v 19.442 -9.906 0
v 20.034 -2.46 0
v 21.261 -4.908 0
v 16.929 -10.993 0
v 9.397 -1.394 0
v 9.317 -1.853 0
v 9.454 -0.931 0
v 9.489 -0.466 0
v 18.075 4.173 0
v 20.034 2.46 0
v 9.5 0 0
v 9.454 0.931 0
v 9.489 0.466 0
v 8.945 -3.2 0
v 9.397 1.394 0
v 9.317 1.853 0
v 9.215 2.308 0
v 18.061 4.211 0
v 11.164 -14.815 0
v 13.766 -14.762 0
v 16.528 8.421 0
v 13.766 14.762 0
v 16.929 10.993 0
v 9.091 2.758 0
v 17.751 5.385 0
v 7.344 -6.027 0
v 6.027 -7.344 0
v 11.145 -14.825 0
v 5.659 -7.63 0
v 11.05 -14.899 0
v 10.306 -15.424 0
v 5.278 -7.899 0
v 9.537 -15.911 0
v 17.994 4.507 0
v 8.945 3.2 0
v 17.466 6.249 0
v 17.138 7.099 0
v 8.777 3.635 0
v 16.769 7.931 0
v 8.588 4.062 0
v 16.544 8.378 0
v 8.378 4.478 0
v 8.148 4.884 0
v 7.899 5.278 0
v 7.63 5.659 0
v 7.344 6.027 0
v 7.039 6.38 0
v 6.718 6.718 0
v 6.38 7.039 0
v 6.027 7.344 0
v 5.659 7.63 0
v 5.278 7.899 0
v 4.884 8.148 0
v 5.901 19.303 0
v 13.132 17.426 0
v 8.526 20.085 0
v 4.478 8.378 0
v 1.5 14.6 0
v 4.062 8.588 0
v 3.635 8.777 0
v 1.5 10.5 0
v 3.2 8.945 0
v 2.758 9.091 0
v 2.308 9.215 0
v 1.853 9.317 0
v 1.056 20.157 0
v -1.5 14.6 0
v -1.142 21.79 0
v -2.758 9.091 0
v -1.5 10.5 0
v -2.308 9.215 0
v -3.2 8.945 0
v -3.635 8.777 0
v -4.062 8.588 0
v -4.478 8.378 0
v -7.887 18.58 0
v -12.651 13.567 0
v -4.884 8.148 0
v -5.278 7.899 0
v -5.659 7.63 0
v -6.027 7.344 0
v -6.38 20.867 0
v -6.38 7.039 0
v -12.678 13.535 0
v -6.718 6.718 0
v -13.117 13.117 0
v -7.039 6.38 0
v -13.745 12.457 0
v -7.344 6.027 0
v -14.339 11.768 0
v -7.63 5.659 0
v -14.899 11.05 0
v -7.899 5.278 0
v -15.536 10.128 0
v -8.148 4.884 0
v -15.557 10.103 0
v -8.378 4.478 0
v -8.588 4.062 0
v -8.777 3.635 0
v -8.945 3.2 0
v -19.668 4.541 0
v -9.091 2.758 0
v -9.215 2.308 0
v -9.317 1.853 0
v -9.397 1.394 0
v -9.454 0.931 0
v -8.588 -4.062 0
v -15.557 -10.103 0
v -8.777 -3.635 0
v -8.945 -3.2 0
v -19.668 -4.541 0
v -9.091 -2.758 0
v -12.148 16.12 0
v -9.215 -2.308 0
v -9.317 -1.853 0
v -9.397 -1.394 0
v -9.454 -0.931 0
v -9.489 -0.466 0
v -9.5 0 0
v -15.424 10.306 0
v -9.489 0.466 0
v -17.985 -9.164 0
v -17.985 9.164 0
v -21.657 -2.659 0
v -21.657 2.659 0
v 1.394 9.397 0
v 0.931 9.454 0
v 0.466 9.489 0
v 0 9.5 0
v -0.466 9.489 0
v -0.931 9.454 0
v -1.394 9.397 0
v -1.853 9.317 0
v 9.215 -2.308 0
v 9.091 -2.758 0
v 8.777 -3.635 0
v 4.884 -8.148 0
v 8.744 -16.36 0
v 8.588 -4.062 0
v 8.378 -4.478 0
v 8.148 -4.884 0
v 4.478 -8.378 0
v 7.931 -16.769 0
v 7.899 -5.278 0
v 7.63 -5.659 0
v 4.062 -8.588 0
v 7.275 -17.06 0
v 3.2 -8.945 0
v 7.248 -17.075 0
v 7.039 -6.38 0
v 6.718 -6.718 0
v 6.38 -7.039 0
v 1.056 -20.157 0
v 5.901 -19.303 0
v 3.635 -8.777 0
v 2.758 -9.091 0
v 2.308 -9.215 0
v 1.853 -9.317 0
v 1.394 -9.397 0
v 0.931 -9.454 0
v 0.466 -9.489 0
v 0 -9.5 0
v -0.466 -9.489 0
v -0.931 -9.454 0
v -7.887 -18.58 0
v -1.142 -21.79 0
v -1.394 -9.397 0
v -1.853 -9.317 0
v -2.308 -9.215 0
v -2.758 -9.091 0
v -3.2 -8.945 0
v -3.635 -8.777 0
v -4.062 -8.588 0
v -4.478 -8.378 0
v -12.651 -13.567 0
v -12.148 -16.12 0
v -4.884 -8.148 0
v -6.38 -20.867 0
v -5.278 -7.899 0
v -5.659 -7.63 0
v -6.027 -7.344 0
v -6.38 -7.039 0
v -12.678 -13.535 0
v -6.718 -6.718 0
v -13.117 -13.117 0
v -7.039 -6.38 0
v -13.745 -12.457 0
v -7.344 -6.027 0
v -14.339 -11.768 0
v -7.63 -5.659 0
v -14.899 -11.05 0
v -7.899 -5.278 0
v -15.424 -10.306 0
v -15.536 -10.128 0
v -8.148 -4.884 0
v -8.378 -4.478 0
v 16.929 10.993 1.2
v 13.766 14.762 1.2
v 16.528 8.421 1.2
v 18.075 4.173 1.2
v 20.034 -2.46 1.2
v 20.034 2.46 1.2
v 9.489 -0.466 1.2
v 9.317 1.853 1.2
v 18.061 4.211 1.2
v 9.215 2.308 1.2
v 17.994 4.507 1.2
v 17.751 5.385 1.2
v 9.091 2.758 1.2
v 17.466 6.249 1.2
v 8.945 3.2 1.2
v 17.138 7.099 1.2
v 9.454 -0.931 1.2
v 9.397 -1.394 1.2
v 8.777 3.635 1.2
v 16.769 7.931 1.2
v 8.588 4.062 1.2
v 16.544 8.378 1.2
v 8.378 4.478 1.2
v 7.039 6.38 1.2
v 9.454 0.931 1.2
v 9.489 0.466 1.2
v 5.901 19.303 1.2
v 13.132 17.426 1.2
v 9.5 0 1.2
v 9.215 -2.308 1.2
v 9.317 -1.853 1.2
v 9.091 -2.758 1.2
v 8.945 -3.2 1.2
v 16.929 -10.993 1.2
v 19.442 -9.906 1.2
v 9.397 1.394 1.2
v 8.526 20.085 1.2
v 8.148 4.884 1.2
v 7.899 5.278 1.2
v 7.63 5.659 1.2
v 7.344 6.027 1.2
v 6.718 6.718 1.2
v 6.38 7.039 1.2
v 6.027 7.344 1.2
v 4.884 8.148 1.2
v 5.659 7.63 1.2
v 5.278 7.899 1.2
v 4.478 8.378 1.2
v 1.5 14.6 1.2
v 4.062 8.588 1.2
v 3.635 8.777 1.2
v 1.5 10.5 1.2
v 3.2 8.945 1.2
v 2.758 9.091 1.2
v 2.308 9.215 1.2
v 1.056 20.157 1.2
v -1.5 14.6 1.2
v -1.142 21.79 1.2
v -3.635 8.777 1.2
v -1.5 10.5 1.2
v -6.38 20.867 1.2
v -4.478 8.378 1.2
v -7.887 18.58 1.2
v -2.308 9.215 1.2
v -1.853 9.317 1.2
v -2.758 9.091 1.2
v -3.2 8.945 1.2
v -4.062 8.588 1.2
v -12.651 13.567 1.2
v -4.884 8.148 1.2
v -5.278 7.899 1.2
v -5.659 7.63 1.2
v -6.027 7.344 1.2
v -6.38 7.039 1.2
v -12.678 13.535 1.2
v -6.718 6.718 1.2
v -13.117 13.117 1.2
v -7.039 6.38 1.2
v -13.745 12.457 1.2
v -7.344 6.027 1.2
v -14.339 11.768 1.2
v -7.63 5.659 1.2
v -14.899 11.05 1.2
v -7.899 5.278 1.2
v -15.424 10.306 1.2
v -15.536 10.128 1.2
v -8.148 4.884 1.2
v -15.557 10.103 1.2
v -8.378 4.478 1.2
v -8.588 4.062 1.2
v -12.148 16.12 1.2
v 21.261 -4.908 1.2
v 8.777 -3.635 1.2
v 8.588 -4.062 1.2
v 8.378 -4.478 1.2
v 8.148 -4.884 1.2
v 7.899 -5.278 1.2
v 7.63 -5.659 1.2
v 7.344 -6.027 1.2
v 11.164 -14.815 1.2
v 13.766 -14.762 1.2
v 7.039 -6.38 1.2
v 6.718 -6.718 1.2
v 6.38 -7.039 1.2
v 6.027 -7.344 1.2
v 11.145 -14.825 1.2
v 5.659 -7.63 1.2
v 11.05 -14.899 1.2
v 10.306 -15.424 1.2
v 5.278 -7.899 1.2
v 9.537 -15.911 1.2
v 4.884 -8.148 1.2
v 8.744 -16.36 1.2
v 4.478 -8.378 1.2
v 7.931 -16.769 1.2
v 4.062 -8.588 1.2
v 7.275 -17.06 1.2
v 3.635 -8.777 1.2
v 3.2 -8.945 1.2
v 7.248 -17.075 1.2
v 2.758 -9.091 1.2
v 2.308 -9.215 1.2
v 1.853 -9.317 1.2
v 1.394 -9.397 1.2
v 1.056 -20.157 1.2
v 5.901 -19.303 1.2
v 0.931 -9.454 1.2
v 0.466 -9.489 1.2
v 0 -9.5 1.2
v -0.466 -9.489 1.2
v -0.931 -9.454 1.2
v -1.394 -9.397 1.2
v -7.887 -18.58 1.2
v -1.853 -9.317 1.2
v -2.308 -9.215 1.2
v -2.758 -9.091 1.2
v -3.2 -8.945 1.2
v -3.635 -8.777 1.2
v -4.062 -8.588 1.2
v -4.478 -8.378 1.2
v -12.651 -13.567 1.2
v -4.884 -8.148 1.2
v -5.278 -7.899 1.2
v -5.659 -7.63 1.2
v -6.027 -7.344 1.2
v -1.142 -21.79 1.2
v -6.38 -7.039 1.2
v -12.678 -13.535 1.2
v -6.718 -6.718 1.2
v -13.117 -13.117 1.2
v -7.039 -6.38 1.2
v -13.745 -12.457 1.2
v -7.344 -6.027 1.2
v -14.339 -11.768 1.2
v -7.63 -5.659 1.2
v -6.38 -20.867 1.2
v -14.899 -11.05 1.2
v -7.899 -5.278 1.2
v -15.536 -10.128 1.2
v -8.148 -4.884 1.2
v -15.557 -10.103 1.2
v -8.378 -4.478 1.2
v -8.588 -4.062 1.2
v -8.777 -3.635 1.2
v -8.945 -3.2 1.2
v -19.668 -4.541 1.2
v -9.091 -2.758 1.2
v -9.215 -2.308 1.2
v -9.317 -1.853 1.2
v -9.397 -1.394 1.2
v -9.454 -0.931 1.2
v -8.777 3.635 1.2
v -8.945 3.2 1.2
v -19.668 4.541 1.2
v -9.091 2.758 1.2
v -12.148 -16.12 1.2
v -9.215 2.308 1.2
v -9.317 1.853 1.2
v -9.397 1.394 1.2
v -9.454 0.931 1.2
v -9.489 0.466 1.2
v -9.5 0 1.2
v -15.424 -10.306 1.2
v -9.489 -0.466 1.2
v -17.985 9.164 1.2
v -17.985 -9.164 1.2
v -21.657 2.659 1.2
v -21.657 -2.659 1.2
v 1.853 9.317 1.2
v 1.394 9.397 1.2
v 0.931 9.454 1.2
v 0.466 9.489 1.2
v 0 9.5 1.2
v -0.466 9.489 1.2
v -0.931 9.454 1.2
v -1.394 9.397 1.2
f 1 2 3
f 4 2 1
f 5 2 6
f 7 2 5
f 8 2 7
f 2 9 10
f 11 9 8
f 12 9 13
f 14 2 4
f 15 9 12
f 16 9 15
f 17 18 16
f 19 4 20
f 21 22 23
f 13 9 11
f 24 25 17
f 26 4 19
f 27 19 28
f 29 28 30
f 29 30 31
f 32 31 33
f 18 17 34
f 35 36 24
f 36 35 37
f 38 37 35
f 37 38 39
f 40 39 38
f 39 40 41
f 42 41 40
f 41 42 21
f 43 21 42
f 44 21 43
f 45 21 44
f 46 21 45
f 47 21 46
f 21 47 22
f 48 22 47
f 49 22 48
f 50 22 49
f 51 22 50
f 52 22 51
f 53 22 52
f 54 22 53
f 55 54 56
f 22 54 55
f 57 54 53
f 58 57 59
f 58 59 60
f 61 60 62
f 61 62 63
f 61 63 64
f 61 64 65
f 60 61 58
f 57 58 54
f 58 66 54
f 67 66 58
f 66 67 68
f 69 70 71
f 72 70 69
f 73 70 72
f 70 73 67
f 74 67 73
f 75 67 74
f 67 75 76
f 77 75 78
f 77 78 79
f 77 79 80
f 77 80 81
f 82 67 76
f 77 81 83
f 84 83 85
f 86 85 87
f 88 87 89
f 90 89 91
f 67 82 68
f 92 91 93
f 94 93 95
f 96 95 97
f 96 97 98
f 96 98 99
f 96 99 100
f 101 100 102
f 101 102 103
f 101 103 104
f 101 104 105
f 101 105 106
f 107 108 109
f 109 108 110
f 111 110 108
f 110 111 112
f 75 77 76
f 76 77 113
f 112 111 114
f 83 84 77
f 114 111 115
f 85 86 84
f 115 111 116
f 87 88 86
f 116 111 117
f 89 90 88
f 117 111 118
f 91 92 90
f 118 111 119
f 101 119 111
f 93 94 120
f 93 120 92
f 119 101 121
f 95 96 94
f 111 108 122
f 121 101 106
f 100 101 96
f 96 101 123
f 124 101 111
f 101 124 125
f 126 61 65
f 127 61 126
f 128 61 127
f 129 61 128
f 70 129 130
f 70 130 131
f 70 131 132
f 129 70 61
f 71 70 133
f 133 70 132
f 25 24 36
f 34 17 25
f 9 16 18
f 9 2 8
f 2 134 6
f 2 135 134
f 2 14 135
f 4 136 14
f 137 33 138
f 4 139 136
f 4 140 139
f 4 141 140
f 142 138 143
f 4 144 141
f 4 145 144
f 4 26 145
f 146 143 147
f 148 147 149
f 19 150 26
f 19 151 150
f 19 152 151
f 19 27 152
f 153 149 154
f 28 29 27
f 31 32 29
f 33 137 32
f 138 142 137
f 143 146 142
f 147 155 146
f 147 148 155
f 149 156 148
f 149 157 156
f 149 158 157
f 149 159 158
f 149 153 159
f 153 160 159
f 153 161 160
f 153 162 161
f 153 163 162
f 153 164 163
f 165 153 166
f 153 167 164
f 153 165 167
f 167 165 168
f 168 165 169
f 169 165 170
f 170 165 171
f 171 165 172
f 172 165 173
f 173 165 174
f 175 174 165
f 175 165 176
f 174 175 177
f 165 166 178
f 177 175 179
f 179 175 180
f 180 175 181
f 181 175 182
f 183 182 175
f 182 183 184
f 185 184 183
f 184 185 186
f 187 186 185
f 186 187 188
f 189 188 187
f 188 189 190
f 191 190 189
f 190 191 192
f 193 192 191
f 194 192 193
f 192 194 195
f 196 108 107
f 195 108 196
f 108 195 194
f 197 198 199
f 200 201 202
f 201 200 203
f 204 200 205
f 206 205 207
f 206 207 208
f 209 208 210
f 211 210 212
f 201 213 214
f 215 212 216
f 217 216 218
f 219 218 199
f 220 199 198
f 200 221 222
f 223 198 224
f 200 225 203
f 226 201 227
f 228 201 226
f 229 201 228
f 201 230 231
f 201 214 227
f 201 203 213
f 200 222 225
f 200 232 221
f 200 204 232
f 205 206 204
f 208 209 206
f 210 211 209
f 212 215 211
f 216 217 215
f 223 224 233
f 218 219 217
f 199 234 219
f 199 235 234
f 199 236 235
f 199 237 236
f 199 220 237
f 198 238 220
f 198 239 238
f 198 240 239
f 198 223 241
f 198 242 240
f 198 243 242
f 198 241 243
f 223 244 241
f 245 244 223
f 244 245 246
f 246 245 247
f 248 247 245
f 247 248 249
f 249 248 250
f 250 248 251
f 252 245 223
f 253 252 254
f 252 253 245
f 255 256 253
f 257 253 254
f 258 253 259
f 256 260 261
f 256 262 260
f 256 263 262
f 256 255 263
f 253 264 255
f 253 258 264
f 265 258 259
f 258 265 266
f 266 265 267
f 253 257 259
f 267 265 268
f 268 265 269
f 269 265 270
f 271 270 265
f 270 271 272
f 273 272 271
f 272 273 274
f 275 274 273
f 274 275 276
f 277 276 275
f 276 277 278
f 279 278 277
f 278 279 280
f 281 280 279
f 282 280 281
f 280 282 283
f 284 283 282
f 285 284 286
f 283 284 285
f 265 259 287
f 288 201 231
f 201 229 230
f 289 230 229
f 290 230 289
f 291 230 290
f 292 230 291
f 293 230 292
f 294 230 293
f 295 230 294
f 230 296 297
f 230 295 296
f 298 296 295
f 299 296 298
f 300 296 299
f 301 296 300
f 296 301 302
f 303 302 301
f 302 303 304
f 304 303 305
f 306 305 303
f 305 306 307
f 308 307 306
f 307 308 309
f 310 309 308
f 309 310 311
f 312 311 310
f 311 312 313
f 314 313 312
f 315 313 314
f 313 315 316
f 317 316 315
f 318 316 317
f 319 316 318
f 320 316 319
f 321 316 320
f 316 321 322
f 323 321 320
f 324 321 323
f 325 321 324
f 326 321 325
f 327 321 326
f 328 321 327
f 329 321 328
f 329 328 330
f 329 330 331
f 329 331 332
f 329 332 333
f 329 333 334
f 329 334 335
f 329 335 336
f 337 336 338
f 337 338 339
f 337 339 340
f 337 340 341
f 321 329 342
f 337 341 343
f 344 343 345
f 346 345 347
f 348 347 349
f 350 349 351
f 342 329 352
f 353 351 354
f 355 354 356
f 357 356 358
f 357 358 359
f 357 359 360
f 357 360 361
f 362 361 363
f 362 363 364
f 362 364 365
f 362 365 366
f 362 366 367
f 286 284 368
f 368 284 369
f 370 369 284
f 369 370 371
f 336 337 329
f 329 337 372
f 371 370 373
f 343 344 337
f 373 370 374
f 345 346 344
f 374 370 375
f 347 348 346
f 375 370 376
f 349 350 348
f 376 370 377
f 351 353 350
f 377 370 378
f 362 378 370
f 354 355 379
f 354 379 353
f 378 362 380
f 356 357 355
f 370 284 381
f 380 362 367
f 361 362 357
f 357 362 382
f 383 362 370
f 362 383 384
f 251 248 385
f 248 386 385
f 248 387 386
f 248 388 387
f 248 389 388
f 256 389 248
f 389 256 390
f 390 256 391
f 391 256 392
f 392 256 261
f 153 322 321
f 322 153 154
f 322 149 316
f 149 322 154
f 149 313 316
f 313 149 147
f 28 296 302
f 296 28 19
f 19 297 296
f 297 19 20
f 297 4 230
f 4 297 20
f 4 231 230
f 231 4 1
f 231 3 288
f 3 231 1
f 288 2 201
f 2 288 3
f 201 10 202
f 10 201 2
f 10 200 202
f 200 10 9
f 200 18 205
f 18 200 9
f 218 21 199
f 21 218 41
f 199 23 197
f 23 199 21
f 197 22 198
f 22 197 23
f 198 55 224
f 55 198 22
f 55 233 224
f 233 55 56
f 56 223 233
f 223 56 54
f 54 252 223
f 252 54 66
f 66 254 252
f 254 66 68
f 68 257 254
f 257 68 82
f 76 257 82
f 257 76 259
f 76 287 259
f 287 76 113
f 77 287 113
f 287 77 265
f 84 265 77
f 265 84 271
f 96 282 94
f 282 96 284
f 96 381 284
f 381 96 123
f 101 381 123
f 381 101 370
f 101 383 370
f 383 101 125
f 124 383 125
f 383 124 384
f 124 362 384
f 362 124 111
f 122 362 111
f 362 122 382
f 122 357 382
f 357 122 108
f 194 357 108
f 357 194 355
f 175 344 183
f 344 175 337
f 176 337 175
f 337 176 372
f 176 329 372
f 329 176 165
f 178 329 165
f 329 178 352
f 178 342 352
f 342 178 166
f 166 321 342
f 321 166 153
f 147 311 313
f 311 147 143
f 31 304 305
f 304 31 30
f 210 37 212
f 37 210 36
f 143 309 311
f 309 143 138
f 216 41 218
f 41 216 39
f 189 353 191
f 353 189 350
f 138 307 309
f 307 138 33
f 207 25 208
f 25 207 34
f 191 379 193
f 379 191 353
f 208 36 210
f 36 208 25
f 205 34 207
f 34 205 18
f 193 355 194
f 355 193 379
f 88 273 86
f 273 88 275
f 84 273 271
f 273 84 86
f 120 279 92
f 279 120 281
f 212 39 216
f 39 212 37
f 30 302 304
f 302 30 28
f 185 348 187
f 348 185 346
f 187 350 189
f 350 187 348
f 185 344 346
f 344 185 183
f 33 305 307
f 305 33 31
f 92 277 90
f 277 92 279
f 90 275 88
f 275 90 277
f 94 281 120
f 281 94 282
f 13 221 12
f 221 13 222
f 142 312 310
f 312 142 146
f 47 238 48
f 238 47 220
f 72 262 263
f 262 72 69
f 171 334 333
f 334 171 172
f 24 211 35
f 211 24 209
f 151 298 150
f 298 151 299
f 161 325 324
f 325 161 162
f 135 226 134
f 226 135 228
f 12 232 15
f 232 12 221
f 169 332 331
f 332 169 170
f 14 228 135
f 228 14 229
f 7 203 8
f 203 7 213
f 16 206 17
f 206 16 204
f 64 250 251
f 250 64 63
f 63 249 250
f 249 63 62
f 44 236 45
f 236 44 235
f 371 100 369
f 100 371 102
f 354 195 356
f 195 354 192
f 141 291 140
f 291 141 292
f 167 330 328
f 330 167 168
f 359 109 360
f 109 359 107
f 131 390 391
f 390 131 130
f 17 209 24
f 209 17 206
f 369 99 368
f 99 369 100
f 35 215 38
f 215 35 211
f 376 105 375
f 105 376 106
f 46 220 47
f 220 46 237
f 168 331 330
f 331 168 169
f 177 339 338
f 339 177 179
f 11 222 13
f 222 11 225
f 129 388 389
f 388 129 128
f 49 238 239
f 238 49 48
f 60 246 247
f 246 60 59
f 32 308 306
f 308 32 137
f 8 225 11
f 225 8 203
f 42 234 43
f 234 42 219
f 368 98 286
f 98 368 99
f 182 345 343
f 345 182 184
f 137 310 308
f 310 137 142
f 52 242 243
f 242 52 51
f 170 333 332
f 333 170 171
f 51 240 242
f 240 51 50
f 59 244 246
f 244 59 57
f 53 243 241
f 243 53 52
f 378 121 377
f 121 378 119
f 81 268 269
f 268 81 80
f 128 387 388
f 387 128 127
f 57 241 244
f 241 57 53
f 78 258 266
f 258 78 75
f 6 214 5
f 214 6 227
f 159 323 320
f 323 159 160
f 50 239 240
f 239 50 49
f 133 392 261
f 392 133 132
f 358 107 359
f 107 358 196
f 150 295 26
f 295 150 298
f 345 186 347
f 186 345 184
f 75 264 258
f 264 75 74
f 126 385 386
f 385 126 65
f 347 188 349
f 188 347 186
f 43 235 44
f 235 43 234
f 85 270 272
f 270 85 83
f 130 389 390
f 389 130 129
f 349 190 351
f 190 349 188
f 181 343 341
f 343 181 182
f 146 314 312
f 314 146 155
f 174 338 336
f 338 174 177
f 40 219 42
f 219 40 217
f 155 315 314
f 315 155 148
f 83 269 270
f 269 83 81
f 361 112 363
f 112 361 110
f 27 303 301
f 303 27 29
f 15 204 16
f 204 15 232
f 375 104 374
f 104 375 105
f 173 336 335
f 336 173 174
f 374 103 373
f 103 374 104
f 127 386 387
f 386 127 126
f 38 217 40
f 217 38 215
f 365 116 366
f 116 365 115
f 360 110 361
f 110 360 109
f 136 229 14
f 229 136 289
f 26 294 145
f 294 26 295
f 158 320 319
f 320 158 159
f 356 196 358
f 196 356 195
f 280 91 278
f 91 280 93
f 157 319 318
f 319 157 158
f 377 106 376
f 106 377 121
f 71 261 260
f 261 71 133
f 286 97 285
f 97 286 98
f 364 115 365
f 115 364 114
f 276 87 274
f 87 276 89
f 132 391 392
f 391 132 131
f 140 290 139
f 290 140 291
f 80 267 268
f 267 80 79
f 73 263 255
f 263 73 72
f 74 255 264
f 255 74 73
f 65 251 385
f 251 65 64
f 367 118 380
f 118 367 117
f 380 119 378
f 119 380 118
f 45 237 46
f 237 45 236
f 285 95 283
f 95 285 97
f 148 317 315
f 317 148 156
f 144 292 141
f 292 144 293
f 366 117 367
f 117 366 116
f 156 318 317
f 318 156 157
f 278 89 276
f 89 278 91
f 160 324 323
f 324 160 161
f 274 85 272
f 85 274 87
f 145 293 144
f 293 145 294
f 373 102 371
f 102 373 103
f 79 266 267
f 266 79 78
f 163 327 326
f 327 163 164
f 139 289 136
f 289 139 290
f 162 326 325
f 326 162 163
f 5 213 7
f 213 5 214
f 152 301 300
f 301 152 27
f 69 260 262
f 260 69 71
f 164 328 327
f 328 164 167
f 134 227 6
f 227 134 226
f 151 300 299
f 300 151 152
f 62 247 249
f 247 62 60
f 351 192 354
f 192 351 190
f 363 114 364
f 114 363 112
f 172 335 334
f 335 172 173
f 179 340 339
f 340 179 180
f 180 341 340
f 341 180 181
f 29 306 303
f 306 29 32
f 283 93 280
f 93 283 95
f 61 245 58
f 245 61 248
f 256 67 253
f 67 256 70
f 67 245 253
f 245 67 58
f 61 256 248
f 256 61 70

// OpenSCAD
/*
  Elna Supermatic cam 28
  Name: Vertical ticks
  Status: candidate

  Generated from measured parametric base v2.
  Surface mode: stepped
*/

include <_elna_measured_common.scad>;

profile_points = [
        [1.0564, 20.1573],
        [5.9015, 19.3030],
        [8.5258, 20.0854],
        [13.1316, 17.4262],
        [13.7661, 14.7624],
        [16.9286, 10.9935],
        [16.5282, 8.4215],
        [18.0746, 4.1728],
        [20.0345, 2.4599],
        [20.0345, -2.4599],
        [21.2608, -4.9084],
        [19.4418, -9.9061],
        [16.9286, -10.9935],
        [13.7661, -14.7624],
        [11.1637, -14.8147],
        [7.2481, -17.0754],
        [5.9015, -19.3030],
        [1.0564, -20.1573],
        [-1.1420, -21.7901],
        [-6.3796, -20.8666],
        [-7.8869, -18.5804],
        [-12.1476, -16.1205],
        [-12.6511, -13.5666],
        [-15.5573, -10.1031],
        [-17.9850, -9.1638],
        [-19.6677, -4.5406],
        [-21.6574, -2.6592],
        [-21.6574, 2.6592],
        [-19.6677, 4.5406],
        [-17.9850, 9.1638],
        [-15.5573, 10.1031],
        [-12.6511, 13.5666],
        [-12.1476, 16.1205],
        [-7.8869, 18.5804],
        [-6.3796, 20.8666],
        [-1.1420, 21.7901]
];

icon_points = [[-1.000,0.180], [-0.920,0.820], [-0.840,0.180], [-0.778,0.180], [-0.698,0.820], [-0.618,0.180], [-0.556,0.180], [-0.476,0.820], [-0.396,0.180], [-0.333,0.180], [-0.253,0.820], [-0.173,0.180], [-0.111,0.180], [-0.031,0.820], [0.049,0.180], [0.111,0.180], [0.191,0.820], [0.271,0.180], [0.333,0.180], [0.413,0.820], [0.493,0.180], [0.556,0.180], [0.636,0.820], [0.716,0.180], [0.778,0.180], [0.858,0.820], [0.938,0.180], [1.000,0.180]];

elna_cam_ring(profile_points=profile_points);
